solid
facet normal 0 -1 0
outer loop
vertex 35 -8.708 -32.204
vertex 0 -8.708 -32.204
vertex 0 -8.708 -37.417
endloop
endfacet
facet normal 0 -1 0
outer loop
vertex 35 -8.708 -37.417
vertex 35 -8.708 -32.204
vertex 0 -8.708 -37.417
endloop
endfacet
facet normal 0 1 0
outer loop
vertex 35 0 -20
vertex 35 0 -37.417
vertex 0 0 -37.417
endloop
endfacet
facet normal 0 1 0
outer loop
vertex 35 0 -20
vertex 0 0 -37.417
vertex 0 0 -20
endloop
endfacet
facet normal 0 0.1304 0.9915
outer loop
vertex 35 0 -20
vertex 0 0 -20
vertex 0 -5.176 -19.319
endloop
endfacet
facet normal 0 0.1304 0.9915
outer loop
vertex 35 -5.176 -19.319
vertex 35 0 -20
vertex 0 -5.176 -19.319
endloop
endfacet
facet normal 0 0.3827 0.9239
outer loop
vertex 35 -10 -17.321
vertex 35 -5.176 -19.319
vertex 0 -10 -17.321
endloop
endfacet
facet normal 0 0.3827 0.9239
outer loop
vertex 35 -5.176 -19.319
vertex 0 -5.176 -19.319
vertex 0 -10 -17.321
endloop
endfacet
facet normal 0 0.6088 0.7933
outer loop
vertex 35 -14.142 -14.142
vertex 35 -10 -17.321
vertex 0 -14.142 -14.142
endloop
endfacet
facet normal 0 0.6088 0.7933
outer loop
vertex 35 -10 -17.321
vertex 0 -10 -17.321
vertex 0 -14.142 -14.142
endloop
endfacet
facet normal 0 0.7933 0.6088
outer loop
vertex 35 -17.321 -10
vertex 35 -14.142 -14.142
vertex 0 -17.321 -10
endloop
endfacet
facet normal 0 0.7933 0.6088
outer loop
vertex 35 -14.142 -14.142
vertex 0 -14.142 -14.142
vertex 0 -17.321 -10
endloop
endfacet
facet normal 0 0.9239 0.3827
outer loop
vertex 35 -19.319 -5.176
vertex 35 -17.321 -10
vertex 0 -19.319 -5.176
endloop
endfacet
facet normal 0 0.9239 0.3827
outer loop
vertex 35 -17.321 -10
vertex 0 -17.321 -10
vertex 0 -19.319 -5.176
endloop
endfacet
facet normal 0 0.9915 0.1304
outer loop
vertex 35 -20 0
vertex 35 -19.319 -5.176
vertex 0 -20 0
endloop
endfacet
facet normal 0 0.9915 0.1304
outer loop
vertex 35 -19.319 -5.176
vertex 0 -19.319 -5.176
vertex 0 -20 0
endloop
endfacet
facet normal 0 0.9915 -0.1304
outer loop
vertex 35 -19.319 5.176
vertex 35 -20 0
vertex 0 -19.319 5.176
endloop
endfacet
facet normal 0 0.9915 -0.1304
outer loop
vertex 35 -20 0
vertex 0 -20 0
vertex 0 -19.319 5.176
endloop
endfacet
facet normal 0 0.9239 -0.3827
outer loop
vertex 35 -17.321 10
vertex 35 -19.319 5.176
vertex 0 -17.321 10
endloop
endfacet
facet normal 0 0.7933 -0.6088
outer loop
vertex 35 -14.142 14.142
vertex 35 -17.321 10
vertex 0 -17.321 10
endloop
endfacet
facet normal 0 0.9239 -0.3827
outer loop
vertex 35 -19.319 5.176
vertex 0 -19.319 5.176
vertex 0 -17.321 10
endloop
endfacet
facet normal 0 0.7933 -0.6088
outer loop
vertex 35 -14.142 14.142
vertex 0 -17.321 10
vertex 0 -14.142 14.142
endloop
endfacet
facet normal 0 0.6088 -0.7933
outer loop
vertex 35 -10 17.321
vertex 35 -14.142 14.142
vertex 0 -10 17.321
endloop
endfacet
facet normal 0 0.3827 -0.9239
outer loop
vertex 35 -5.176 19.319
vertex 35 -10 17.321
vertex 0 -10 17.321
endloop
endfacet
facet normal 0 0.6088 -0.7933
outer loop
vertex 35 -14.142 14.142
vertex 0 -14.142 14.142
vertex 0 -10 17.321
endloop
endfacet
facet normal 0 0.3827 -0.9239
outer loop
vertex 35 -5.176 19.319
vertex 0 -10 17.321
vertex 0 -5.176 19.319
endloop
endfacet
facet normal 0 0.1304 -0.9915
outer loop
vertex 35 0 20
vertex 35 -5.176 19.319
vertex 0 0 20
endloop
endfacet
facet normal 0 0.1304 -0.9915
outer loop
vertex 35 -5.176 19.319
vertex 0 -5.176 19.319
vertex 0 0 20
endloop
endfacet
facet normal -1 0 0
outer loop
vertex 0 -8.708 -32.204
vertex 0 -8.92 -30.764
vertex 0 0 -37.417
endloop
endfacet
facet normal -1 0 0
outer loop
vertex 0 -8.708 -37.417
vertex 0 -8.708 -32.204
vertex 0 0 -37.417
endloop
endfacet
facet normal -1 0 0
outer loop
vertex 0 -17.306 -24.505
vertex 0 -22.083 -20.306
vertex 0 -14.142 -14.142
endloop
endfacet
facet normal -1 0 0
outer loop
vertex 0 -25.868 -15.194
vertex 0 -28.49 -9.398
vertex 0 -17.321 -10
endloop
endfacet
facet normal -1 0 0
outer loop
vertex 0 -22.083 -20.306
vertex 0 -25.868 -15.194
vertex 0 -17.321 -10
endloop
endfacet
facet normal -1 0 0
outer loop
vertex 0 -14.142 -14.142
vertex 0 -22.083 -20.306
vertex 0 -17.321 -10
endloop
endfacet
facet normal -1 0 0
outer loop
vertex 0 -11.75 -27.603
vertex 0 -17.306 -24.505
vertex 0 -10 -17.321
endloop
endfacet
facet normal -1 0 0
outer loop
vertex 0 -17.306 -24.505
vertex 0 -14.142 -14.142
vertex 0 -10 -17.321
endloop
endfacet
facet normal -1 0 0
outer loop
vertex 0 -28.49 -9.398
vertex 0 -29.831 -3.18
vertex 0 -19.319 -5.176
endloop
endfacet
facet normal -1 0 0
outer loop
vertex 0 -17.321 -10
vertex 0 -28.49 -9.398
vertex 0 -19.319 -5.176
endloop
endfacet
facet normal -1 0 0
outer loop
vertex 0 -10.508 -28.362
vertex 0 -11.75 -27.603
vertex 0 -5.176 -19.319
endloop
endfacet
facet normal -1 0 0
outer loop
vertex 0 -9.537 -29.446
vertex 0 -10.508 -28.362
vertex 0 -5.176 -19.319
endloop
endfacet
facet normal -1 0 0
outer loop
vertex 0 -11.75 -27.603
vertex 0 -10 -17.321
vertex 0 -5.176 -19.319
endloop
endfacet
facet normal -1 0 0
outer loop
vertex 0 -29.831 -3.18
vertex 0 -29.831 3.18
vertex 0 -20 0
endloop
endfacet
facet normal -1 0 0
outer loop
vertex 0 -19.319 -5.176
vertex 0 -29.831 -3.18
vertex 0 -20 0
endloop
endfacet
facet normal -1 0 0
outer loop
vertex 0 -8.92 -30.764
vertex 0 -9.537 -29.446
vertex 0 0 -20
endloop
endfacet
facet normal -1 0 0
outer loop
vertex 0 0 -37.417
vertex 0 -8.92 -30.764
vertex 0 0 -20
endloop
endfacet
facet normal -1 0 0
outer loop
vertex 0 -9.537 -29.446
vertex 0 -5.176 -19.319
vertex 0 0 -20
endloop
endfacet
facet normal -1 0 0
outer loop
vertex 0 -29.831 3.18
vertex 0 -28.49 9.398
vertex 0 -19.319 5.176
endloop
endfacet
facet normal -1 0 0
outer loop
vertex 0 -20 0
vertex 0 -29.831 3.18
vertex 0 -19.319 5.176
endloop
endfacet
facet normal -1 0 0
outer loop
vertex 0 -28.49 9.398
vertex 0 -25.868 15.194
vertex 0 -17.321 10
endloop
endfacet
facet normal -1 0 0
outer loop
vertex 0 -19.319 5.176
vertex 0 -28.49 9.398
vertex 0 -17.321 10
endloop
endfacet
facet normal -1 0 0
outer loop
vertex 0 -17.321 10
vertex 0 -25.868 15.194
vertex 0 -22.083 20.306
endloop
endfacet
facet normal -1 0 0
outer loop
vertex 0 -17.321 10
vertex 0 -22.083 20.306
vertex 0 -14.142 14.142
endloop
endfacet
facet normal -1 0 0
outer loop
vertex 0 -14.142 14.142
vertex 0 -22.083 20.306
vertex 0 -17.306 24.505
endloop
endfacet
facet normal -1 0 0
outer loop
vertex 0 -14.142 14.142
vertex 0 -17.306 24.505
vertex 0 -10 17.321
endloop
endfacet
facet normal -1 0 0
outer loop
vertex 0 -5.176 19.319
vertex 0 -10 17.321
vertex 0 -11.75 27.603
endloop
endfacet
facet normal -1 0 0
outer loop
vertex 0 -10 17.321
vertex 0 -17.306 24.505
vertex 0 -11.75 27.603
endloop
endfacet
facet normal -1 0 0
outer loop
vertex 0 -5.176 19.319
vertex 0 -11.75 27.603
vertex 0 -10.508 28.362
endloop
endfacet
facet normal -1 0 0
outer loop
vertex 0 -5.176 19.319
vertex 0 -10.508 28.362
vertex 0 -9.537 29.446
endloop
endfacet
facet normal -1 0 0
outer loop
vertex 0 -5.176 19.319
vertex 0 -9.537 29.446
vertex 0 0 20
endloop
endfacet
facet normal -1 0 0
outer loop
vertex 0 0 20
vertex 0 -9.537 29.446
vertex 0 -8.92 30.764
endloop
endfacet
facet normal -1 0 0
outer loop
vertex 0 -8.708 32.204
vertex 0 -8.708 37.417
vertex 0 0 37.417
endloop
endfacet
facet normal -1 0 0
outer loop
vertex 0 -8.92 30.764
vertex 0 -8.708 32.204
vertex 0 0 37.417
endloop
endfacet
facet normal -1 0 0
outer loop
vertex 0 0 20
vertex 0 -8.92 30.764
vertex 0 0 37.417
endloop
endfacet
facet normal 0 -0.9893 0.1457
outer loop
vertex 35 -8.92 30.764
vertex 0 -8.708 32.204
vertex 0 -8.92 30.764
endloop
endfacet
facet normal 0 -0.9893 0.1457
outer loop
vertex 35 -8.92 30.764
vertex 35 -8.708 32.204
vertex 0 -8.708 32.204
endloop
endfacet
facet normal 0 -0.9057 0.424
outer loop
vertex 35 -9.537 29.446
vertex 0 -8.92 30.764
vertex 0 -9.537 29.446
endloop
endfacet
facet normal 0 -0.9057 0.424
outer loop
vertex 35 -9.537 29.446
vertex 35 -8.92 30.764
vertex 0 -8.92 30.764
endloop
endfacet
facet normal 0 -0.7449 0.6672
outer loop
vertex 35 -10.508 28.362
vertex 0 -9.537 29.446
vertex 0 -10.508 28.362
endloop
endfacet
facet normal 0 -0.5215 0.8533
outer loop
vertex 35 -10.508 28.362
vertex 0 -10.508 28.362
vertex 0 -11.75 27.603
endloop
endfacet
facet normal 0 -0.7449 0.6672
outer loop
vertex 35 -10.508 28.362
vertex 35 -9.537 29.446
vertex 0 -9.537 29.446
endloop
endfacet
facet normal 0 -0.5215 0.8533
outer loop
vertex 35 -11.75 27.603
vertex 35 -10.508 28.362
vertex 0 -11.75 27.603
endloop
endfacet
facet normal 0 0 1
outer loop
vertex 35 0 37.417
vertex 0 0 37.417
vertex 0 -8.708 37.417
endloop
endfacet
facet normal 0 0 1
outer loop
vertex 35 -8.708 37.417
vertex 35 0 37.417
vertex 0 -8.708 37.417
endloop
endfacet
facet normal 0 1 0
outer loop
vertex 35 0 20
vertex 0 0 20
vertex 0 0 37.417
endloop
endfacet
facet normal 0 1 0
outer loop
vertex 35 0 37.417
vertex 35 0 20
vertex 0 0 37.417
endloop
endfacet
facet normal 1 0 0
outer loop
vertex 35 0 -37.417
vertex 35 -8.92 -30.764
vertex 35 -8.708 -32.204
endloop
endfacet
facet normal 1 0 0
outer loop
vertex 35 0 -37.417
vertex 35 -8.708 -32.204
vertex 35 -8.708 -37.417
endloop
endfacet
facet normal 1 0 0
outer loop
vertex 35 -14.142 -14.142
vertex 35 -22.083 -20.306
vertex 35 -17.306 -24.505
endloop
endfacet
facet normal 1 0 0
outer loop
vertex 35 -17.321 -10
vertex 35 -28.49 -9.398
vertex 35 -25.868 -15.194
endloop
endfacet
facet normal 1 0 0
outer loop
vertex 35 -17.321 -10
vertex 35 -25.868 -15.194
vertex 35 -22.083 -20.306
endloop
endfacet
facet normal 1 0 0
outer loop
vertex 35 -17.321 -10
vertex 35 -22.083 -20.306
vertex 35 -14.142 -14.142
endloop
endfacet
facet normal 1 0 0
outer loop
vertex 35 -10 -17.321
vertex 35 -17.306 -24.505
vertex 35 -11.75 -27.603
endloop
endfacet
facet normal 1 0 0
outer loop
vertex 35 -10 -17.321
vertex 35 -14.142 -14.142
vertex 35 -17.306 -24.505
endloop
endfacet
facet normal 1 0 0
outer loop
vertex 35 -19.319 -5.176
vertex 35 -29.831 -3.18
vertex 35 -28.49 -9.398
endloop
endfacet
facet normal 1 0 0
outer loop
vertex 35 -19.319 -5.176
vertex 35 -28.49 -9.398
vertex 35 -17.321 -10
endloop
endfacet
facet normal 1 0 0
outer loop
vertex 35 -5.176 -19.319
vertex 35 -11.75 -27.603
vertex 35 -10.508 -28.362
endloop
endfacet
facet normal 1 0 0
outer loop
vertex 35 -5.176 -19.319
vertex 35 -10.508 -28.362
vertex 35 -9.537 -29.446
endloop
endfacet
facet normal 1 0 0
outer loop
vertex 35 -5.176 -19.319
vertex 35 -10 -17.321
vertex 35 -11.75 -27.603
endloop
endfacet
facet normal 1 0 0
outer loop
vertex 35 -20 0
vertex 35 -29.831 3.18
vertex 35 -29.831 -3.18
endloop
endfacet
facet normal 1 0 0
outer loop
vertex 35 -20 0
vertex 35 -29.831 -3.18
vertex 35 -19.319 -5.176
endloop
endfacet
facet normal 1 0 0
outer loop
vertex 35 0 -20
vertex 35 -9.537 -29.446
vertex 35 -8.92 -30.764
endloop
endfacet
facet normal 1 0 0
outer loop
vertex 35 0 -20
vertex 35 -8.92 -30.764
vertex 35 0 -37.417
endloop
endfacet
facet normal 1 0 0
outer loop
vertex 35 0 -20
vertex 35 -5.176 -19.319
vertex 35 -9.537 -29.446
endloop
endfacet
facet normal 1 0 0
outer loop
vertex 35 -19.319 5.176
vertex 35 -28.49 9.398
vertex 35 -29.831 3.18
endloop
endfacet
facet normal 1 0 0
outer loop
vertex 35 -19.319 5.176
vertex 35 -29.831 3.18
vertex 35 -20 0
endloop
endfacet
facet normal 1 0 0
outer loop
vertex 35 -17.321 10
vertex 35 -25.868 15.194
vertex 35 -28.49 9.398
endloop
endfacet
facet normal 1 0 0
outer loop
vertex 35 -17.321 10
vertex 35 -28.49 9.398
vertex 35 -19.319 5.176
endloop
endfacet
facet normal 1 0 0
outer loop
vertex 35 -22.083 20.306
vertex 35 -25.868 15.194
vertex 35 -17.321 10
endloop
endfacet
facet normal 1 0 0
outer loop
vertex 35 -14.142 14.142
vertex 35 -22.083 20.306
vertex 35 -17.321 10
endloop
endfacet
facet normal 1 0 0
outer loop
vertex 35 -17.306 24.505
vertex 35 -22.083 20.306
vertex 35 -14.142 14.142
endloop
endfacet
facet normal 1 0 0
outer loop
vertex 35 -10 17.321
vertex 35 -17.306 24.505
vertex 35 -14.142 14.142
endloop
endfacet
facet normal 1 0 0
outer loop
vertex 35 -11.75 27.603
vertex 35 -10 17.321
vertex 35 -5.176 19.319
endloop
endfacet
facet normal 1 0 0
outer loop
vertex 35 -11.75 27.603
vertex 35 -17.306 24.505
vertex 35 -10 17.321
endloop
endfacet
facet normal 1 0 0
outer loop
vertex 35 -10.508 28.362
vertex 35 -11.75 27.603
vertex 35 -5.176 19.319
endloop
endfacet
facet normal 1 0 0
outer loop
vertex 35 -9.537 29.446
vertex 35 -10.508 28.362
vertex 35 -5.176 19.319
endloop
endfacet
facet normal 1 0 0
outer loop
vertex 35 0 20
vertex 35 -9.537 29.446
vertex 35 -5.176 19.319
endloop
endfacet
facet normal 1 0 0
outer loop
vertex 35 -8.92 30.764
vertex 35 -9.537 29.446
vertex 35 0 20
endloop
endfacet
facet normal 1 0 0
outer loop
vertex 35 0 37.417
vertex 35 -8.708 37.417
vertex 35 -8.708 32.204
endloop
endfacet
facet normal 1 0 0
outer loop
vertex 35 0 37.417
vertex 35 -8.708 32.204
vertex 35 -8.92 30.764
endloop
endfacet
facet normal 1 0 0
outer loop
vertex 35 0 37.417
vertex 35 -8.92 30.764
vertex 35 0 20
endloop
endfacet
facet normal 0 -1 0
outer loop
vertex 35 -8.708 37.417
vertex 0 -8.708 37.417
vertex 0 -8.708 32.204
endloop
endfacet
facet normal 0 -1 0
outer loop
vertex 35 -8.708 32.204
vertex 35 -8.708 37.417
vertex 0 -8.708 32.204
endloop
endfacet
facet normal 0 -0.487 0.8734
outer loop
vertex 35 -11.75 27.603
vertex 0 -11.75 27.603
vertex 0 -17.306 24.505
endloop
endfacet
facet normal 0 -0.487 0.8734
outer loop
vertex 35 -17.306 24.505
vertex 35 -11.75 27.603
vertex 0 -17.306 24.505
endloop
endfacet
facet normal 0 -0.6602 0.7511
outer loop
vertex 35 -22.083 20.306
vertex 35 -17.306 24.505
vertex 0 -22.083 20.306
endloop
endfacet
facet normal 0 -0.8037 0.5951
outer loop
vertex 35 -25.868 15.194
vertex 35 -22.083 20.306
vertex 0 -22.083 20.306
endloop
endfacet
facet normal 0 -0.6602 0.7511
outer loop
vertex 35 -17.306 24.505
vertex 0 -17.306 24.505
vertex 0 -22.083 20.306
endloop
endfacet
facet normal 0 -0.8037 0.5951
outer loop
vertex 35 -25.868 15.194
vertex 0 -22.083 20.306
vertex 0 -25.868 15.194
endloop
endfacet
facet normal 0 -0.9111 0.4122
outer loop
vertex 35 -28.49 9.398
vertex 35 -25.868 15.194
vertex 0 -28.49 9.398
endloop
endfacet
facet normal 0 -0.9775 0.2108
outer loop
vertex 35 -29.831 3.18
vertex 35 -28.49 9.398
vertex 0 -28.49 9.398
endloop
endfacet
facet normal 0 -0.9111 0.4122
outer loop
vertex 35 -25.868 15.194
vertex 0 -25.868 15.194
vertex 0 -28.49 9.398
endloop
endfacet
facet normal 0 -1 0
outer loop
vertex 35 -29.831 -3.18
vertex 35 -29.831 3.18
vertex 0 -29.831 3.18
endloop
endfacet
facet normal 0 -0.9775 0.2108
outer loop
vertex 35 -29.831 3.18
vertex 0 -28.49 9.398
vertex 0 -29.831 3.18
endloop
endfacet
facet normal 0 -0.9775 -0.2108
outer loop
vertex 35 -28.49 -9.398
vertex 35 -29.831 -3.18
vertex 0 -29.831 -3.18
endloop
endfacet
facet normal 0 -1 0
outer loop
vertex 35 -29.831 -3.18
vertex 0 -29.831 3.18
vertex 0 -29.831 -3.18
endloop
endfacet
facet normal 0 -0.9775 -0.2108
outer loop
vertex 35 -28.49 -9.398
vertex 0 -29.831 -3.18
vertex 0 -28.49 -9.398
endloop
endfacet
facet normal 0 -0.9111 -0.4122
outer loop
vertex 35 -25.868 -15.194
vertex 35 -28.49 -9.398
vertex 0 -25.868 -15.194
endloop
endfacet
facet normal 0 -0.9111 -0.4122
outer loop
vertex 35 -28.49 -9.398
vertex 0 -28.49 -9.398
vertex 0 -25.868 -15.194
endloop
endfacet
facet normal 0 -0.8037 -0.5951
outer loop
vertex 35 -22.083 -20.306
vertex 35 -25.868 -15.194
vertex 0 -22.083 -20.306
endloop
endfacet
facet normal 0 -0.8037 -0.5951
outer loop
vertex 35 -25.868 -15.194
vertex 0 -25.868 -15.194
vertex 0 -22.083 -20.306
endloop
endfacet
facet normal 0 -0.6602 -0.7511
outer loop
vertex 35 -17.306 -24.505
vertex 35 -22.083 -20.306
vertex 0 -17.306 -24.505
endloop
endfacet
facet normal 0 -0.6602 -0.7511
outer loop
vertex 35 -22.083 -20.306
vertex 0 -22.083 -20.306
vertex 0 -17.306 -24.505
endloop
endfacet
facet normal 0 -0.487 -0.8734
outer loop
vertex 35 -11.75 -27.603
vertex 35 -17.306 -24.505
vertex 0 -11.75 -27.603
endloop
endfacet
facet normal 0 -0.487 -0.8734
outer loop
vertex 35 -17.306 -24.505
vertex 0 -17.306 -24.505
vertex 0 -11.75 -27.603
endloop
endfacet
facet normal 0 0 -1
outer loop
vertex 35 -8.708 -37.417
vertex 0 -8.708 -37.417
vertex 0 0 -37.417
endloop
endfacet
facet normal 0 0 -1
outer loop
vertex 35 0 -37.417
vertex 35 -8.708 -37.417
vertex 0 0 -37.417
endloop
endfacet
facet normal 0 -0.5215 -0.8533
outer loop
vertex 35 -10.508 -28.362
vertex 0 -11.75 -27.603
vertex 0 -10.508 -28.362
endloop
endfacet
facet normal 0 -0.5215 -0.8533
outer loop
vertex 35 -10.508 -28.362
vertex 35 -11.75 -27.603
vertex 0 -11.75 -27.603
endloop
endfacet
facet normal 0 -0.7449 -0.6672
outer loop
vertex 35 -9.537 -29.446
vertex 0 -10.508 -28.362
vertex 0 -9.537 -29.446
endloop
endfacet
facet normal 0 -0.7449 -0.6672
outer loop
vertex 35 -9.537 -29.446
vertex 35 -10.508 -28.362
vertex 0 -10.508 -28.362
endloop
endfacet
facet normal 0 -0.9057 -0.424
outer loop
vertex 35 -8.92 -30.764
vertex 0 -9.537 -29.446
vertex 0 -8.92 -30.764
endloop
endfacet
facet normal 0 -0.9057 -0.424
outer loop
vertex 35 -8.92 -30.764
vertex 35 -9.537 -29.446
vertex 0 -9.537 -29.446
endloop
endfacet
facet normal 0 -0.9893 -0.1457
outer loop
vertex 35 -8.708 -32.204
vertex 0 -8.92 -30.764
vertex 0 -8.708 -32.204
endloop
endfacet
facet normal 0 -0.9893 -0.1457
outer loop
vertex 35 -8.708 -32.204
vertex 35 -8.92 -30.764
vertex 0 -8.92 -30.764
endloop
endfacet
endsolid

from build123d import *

# Parameters (mm, degrees)
F1_DEPTH = 35
F2_R     = 5


with BuildPart() as f1:
    # F0 (on Right) → F1 (new body)
    with BuildSketch(Plane.YZ):
        with BuildLine():
            ThreePointArc((0, -20), (-20, 0), (0, 20))
            Line((0, 20), (0, 37.416574))
            Line((0, 37.416574), (-8.708287, 37.416574))
            Line((-8.708287, 37.416574), (-8.708287, 28.708287))
            ThreePointArc((-8.708287, 28.708287), (-30, 0), (-8.708287, -28.708287))
            Line((-8.708287, -28.708287), (-8.708287, -37.416574))
            Line((-8.708287, -37.416574), (0, -37.416574))
            Line((0, -37.416574), (0, -20))
        make_face()
    extrude(amount=F1_DEPTH)

    # F2
    f2_edges = [f1.edges().sort_by_distance(p)[0] for p in [
        (17.5, -8.708287, 28.708287),
        (17.5, -8.708287, -28.708287),
    ]]
    fillet(f2_edges, radius=F2_R)


solid = f1.part
